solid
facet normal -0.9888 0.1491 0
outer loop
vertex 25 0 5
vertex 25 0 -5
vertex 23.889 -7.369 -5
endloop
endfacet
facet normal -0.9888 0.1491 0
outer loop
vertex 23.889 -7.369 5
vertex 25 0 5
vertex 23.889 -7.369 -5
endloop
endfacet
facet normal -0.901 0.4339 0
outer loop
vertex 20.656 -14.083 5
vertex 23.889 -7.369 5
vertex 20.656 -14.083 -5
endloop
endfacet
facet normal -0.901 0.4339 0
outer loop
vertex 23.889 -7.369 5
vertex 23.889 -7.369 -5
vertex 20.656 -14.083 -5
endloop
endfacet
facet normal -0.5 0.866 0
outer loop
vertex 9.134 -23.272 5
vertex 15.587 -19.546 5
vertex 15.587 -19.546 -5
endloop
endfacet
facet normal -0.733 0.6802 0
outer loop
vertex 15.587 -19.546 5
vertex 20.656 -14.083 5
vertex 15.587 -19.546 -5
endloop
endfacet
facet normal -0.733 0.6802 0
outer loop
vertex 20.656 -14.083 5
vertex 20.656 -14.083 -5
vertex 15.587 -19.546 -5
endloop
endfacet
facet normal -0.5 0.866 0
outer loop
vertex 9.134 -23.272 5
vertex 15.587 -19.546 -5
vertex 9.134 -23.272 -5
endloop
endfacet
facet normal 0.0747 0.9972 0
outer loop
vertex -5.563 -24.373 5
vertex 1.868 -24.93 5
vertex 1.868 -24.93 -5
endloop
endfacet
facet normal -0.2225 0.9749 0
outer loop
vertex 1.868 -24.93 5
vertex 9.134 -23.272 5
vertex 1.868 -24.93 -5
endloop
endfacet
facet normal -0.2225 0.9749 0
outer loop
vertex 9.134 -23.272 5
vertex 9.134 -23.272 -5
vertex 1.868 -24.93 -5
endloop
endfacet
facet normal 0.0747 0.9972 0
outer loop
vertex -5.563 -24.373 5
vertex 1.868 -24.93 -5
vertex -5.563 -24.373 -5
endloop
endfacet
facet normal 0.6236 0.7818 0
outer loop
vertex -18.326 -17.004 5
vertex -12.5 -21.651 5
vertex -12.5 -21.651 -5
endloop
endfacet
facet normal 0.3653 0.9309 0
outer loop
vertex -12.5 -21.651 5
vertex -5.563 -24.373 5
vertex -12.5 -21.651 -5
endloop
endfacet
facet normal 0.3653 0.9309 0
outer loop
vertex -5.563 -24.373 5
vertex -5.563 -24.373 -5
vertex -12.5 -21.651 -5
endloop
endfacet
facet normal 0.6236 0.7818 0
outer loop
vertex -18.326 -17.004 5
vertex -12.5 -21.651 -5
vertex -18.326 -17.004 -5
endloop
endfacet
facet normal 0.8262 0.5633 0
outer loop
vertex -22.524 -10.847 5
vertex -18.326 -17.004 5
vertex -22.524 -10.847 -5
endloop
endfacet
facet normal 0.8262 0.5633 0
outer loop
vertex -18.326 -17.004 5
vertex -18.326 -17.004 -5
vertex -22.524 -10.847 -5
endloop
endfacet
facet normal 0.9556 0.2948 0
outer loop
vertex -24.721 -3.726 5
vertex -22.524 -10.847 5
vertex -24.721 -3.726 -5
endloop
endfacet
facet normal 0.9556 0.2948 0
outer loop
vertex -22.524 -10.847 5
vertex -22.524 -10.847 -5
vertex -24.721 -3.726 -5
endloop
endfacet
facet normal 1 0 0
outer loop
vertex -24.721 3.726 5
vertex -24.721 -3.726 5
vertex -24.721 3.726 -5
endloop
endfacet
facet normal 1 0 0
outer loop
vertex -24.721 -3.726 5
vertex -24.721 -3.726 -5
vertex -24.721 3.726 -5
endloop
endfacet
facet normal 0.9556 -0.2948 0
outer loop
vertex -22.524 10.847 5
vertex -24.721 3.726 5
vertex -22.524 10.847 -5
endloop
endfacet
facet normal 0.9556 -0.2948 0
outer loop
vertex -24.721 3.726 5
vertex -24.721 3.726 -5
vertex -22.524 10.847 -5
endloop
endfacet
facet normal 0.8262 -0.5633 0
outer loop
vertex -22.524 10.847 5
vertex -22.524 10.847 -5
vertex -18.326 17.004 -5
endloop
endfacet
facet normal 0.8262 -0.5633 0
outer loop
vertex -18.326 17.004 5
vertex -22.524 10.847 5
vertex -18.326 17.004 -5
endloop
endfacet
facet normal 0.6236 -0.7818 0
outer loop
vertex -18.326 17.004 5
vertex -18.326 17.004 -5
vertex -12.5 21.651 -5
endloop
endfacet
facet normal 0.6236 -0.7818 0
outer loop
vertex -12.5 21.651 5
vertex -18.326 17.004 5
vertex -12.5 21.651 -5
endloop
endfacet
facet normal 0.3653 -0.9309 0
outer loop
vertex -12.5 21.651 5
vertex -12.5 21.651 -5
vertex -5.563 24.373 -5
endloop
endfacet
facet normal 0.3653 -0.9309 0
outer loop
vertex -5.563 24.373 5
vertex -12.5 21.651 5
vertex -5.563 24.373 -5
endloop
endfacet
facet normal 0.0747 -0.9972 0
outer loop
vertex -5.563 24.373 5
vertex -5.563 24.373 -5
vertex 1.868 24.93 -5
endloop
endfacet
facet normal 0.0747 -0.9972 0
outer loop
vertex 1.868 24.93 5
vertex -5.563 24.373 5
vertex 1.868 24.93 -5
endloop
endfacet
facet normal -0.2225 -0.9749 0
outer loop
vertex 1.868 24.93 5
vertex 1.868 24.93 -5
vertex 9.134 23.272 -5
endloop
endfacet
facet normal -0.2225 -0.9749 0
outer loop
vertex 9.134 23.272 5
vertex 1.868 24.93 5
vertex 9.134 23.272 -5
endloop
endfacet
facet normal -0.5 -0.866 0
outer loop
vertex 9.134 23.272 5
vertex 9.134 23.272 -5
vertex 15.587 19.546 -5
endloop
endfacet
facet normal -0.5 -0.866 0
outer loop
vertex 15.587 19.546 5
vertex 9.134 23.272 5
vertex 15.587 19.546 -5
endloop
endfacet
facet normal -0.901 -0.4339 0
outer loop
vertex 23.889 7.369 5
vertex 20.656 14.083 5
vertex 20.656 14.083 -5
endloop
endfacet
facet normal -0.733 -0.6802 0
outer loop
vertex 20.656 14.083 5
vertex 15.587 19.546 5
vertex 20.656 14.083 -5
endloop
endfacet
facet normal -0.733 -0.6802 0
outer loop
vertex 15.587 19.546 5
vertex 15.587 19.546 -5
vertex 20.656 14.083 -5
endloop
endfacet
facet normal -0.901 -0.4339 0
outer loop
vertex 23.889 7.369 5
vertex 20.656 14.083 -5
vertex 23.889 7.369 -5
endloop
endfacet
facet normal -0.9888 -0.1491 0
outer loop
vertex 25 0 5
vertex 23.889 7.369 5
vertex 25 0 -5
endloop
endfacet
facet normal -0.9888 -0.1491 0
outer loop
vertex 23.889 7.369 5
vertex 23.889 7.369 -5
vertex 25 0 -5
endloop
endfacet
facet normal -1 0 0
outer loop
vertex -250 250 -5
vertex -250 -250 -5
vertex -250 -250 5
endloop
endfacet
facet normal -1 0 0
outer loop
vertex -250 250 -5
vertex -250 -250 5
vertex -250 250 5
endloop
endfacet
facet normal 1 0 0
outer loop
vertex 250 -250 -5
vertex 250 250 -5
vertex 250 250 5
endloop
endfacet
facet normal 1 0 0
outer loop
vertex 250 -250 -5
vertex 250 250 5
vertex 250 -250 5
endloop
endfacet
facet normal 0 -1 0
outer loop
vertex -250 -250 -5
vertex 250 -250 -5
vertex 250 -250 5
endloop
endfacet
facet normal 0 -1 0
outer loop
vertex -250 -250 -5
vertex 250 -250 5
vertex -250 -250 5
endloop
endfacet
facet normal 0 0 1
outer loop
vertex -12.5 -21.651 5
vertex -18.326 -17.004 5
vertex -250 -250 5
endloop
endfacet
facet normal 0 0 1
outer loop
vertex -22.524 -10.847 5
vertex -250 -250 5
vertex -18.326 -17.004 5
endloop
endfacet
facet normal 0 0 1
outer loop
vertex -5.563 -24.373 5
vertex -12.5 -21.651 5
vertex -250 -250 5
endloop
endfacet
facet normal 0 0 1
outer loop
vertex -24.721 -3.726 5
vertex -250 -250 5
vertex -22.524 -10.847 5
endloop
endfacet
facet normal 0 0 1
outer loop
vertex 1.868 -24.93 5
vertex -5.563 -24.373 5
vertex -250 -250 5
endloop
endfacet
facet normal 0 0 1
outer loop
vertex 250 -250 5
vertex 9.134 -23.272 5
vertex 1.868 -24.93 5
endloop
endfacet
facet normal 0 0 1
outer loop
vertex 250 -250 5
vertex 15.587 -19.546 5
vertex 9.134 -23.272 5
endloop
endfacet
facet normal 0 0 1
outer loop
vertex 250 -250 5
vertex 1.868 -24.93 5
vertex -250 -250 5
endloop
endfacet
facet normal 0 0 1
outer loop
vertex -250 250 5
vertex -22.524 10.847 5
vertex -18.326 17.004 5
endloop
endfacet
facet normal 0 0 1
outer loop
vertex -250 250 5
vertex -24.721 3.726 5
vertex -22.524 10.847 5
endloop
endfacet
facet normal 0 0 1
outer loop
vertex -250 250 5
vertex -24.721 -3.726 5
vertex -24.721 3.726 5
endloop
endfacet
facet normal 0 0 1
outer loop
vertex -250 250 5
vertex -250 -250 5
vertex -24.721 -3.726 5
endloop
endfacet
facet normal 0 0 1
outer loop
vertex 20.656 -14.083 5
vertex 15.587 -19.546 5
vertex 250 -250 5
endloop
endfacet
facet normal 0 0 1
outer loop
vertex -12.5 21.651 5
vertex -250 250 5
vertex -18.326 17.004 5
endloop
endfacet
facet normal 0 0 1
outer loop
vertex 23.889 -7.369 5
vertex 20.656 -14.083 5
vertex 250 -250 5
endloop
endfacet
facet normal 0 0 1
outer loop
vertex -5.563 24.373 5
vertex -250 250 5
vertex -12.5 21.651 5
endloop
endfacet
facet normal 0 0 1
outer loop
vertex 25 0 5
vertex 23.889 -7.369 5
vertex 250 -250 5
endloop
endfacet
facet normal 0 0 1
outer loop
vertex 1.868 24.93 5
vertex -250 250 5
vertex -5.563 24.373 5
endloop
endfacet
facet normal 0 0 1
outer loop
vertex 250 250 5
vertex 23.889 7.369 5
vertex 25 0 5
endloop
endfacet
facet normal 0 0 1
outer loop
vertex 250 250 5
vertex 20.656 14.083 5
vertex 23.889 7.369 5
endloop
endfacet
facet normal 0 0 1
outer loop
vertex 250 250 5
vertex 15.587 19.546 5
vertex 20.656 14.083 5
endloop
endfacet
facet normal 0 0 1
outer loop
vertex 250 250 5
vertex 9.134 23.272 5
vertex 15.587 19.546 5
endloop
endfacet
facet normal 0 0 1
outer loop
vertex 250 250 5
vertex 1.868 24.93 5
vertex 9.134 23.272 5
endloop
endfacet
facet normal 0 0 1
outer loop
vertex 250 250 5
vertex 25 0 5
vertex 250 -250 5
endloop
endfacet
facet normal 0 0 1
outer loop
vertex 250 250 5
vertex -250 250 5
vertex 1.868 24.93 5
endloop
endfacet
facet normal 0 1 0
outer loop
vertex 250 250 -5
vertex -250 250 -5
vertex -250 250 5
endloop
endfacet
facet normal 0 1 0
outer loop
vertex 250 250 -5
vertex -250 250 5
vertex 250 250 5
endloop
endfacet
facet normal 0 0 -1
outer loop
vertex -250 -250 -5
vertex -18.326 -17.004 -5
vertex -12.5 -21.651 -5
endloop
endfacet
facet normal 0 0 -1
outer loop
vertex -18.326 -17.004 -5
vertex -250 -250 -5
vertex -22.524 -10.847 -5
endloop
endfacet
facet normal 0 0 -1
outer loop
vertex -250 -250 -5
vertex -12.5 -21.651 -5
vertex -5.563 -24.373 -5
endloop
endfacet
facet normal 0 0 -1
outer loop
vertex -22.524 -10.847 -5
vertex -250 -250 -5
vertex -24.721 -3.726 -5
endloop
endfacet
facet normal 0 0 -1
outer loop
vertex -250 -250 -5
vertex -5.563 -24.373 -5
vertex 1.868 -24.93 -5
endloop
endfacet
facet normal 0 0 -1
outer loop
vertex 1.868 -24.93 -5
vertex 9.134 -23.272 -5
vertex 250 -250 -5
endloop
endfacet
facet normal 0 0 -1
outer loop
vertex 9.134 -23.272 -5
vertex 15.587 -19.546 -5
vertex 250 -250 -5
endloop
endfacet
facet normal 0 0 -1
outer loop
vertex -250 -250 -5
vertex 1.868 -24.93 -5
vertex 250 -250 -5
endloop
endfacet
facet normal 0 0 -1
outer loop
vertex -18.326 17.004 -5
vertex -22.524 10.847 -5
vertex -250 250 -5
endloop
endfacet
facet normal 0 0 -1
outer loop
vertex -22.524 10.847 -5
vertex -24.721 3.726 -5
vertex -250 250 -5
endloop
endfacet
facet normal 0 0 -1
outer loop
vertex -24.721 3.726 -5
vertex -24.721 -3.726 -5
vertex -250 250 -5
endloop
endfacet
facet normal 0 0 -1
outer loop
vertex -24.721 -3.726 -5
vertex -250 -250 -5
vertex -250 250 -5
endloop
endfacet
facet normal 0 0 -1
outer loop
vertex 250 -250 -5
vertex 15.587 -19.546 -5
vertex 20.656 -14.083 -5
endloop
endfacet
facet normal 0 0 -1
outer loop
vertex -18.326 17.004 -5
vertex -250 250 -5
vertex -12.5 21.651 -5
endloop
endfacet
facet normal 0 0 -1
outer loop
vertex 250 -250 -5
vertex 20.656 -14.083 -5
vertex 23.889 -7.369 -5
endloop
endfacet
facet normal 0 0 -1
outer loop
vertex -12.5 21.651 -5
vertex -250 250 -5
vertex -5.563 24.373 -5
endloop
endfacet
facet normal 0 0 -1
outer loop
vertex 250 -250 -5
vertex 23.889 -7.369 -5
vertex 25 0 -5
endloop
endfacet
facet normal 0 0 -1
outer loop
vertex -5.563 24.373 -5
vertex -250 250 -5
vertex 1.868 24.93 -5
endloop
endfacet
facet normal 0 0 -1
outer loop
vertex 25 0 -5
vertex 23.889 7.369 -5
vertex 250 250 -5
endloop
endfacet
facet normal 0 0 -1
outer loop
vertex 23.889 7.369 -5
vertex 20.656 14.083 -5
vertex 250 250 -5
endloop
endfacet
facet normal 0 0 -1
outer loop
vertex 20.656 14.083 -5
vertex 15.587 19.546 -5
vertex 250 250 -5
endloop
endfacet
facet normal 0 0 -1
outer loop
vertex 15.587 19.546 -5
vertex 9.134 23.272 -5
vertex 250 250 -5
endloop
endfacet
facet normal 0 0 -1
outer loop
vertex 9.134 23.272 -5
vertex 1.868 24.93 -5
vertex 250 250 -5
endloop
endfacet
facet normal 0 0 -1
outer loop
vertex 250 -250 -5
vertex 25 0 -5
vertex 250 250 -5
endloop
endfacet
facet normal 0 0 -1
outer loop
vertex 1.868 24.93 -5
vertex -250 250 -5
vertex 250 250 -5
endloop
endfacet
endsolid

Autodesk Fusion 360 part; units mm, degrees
sketch "Sketch1" plane through (0, 0, 0) normal (0, 0, 1) x (1, 0, 0)
  circle A0 centre (0, 0) radius 25
  line L0 (-250, 250) -> (250, 250)
  line L1 (250, 250) -> (250, -250)
  line L2 (250, -250) -> (-250, -250)
  line L3 (-250, -250) -> (-250, 250)
  line L4 (-250, 0) -> (250, 0) construction
  line L5 (0, -250) -> (0, 250) construction
  dimension "Total_Width" = 500
  dimension "Hole_Radius" = 25
extrude "Extrude1" add sketch "Sketch1" along normal mid plane 10
equation "Thickness = 1 cm"
